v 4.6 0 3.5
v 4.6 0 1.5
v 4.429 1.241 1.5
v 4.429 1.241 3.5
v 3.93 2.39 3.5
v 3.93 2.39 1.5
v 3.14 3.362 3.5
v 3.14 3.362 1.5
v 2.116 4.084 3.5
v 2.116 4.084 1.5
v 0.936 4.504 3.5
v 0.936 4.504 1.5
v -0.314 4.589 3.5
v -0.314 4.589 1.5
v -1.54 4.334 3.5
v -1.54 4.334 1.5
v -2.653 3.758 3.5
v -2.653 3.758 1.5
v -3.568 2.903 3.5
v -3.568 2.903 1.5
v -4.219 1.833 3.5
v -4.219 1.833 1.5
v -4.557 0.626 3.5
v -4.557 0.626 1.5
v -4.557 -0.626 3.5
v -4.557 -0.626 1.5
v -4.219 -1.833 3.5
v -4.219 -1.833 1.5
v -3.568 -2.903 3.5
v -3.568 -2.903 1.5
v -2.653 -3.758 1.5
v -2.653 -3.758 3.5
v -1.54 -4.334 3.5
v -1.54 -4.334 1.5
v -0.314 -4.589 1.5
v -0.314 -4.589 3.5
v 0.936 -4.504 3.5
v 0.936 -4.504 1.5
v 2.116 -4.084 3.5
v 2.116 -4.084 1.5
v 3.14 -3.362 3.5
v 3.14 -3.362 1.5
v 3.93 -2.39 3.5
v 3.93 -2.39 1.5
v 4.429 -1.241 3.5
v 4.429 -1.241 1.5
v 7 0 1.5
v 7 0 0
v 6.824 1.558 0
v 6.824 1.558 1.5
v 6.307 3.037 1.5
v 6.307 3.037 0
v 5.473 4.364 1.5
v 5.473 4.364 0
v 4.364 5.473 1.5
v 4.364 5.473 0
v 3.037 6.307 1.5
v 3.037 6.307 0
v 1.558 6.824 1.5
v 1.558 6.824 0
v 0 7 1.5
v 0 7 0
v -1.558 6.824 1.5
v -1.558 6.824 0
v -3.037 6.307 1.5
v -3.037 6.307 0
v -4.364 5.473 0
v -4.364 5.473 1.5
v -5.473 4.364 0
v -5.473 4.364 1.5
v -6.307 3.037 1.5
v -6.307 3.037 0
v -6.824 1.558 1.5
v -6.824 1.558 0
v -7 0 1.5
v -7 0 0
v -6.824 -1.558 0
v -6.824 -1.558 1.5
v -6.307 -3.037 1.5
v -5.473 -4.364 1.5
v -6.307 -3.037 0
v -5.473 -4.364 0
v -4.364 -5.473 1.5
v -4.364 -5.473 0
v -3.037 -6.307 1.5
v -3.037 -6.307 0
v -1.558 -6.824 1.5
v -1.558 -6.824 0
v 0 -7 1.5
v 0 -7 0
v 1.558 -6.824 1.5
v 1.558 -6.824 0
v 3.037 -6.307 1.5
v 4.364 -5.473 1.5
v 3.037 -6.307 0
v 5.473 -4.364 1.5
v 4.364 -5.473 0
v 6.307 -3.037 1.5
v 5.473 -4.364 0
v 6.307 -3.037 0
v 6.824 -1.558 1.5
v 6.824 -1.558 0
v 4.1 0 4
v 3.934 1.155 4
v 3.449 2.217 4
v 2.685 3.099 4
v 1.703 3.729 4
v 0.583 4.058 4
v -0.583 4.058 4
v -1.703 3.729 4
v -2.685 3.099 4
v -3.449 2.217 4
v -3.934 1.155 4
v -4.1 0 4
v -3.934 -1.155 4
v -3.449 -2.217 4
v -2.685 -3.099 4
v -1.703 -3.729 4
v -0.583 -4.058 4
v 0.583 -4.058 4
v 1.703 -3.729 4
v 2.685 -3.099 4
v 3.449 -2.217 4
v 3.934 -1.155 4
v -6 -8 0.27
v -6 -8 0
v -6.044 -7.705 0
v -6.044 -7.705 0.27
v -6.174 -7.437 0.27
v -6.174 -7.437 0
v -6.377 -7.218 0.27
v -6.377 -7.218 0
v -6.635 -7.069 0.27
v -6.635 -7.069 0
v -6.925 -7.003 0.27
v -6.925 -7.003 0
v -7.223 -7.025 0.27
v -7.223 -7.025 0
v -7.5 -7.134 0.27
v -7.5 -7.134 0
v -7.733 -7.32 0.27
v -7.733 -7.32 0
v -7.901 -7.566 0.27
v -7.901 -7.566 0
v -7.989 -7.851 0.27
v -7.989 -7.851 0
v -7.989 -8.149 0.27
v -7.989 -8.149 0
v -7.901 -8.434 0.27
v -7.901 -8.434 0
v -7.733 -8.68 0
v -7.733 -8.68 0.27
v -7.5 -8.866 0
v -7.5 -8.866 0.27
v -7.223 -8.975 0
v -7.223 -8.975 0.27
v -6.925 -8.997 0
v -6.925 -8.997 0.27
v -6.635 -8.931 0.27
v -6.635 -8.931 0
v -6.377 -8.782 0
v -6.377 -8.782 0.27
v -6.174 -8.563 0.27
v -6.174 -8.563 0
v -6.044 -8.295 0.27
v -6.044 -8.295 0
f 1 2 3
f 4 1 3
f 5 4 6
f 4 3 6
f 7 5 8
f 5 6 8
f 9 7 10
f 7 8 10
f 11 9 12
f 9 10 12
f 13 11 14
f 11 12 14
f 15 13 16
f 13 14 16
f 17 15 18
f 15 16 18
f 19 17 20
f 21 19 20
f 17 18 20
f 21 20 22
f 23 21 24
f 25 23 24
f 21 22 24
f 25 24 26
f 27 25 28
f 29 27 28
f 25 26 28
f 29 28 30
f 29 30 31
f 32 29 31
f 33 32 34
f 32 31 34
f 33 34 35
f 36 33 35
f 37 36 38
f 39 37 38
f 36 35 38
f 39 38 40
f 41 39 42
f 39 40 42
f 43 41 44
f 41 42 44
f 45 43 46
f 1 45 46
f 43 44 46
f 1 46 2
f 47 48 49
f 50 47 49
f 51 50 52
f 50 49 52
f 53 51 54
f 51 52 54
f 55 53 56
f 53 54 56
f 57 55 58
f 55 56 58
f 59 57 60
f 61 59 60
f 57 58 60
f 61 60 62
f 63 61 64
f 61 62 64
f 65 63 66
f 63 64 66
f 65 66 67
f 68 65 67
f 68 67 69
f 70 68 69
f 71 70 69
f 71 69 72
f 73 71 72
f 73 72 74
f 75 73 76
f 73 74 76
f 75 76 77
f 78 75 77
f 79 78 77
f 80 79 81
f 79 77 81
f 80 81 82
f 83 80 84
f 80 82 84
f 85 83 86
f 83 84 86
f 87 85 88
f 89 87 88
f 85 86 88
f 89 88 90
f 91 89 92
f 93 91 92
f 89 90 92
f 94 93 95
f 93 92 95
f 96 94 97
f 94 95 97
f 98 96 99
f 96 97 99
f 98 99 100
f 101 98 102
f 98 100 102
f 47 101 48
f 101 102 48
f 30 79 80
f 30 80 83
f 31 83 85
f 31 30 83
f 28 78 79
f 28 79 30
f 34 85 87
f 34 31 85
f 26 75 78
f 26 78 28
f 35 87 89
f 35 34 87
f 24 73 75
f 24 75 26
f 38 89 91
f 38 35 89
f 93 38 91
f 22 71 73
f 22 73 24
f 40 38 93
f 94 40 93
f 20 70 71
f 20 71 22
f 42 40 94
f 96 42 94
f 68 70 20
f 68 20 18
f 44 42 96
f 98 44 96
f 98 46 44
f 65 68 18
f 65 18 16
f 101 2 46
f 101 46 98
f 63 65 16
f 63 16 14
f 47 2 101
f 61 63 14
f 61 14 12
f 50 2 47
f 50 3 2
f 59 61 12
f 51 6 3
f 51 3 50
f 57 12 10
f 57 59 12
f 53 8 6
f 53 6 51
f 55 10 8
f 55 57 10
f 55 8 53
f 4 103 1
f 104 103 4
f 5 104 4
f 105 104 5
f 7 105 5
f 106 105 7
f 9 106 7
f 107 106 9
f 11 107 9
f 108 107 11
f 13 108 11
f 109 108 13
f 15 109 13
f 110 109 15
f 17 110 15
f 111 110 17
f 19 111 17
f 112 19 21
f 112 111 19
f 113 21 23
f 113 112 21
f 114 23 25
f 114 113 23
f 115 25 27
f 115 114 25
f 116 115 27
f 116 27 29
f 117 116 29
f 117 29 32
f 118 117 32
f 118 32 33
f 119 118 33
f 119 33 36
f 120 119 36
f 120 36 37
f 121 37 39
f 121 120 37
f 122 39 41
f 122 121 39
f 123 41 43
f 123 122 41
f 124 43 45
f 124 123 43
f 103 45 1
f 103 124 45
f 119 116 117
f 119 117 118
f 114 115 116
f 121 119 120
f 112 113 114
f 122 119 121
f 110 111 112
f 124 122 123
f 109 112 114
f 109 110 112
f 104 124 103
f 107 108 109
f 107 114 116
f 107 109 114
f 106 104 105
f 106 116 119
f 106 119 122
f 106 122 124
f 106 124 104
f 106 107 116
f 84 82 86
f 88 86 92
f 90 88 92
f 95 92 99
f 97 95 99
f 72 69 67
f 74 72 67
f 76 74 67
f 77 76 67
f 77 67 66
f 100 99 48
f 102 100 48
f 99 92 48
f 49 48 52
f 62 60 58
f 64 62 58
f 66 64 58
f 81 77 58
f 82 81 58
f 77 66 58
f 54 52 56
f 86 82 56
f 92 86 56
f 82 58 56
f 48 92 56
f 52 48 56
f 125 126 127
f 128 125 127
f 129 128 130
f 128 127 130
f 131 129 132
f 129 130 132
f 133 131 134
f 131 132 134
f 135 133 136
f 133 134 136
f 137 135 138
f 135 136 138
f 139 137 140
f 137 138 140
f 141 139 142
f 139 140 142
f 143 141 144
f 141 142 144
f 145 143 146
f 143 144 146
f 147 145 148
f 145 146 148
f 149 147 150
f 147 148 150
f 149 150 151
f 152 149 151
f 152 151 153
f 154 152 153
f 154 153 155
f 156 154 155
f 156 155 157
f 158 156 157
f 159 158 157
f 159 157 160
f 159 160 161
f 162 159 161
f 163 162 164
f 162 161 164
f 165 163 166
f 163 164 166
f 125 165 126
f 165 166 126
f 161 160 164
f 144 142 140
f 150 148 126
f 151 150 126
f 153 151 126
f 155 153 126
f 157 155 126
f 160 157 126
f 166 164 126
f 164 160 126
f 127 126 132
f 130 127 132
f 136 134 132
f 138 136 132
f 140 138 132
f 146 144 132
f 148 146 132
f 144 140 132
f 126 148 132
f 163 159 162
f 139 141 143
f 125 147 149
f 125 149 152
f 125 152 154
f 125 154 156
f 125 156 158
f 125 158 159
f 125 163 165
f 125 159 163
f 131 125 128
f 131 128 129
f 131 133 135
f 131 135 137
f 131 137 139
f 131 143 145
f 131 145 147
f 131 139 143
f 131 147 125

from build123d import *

# Parameters (mm, degrees)
SKETCH_R     = 7
PAD_DEPTH    = 1.5
SKETCH001_R  = 4.6
PAD001_DEPTH = 2.5
CHAMFER_SIZE = 0.5
SKETCH002_R  = 1
PAD002_DEPTH = 0.27


with BuildPart() as chamfer_body:
    # Sketch → Pad (new body)
    with BuildSketch(Plane.XY):
        Circle(SKETCH_R)
    extrude(amount=PAD_DEPTH)

    # Sketch001 → Pad001 (new body)
    with BuildSketch(Plane.XY.offset(1.5)):
        Circle(SKETCH001_R)
    extrude(amount=PAD001_DEPTH)

    # Chamfer
    chamfer_edges = [chamfer_body.edges().sort_by_distance(p)[0] for p in [
        (-4.6, 0, 4),
    ]]
    chamfer(chamfer_edges, length=CHAMFER_SIZE)


with BuildPart() as pad002:
    # Sketch002 → Pad002 (new body)
    with BuildSketch(Plane.XY):
        with Locations((-7, -8)):
            Circle(SKETCH002_R)
    extrude(amount=PAD002_DEPTH)


solid = Compound([chamfer_body.part, pad002.part])
